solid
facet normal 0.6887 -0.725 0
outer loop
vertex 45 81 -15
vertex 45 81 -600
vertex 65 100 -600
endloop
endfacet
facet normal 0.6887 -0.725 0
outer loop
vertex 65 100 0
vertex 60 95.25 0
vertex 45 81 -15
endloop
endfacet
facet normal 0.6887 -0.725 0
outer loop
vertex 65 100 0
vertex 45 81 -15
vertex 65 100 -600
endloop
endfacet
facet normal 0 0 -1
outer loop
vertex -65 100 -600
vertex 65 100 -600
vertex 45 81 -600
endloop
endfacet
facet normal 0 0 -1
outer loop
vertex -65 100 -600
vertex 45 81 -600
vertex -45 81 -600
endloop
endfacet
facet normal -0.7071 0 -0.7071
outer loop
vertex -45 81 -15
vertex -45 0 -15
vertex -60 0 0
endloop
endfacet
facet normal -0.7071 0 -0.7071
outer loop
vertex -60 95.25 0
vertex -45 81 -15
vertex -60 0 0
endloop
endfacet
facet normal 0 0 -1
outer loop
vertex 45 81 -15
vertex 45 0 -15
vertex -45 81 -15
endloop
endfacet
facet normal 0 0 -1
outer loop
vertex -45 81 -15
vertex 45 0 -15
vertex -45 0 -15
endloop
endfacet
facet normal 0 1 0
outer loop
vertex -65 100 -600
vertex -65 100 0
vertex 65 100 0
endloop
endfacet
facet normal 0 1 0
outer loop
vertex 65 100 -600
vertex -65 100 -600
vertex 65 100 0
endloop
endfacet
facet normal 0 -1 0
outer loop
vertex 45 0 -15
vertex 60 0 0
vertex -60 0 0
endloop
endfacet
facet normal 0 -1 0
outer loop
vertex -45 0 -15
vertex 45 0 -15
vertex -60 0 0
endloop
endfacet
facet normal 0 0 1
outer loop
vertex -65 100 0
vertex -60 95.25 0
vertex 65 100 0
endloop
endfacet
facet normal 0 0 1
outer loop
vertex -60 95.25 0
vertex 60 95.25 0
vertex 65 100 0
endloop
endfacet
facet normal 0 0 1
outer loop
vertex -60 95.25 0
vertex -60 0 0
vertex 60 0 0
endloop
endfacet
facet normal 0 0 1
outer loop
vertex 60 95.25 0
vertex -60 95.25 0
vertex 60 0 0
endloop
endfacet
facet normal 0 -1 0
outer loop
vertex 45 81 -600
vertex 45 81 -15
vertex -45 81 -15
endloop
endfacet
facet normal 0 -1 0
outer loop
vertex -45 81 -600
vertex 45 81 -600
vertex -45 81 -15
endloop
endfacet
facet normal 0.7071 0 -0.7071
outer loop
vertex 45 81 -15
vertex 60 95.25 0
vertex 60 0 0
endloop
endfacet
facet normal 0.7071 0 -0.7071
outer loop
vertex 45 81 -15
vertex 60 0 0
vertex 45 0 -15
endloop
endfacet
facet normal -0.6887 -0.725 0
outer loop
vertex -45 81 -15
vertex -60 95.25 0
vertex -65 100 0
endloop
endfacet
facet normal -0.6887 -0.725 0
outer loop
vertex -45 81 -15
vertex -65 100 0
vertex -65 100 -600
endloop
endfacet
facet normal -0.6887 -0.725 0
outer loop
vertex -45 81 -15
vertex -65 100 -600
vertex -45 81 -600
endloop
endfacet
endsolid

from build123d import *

# Parameters (mm, degrees)
BOSS_EXTRUDE1_DEPTH = 600
BOSS_EXTRUDE2_DEPTH = 100


with BuildPart() as part:
    # Sketch1 → Boss-Extrude1 (new body)
    with BuildSketch(Plane.XY):
        Polygon((-65, 100), (65, 100), (60, 95.25), (45, 81), (-45, 81), (-60, 95.25), align=None)
    extrude(amount=-BOSS_EXTRUDE1_DEPTH)

    # Sketch2 → Boss-Extrude2 (add)
    with BuildSketch(Plane.XZ):
        Polygon((-45, -15), (-60, 0), (60, 0), (45, -15), align=None)
    extrude(amount=-BOSS_EXTRUDE2_DEPTH)


solid = part.part
